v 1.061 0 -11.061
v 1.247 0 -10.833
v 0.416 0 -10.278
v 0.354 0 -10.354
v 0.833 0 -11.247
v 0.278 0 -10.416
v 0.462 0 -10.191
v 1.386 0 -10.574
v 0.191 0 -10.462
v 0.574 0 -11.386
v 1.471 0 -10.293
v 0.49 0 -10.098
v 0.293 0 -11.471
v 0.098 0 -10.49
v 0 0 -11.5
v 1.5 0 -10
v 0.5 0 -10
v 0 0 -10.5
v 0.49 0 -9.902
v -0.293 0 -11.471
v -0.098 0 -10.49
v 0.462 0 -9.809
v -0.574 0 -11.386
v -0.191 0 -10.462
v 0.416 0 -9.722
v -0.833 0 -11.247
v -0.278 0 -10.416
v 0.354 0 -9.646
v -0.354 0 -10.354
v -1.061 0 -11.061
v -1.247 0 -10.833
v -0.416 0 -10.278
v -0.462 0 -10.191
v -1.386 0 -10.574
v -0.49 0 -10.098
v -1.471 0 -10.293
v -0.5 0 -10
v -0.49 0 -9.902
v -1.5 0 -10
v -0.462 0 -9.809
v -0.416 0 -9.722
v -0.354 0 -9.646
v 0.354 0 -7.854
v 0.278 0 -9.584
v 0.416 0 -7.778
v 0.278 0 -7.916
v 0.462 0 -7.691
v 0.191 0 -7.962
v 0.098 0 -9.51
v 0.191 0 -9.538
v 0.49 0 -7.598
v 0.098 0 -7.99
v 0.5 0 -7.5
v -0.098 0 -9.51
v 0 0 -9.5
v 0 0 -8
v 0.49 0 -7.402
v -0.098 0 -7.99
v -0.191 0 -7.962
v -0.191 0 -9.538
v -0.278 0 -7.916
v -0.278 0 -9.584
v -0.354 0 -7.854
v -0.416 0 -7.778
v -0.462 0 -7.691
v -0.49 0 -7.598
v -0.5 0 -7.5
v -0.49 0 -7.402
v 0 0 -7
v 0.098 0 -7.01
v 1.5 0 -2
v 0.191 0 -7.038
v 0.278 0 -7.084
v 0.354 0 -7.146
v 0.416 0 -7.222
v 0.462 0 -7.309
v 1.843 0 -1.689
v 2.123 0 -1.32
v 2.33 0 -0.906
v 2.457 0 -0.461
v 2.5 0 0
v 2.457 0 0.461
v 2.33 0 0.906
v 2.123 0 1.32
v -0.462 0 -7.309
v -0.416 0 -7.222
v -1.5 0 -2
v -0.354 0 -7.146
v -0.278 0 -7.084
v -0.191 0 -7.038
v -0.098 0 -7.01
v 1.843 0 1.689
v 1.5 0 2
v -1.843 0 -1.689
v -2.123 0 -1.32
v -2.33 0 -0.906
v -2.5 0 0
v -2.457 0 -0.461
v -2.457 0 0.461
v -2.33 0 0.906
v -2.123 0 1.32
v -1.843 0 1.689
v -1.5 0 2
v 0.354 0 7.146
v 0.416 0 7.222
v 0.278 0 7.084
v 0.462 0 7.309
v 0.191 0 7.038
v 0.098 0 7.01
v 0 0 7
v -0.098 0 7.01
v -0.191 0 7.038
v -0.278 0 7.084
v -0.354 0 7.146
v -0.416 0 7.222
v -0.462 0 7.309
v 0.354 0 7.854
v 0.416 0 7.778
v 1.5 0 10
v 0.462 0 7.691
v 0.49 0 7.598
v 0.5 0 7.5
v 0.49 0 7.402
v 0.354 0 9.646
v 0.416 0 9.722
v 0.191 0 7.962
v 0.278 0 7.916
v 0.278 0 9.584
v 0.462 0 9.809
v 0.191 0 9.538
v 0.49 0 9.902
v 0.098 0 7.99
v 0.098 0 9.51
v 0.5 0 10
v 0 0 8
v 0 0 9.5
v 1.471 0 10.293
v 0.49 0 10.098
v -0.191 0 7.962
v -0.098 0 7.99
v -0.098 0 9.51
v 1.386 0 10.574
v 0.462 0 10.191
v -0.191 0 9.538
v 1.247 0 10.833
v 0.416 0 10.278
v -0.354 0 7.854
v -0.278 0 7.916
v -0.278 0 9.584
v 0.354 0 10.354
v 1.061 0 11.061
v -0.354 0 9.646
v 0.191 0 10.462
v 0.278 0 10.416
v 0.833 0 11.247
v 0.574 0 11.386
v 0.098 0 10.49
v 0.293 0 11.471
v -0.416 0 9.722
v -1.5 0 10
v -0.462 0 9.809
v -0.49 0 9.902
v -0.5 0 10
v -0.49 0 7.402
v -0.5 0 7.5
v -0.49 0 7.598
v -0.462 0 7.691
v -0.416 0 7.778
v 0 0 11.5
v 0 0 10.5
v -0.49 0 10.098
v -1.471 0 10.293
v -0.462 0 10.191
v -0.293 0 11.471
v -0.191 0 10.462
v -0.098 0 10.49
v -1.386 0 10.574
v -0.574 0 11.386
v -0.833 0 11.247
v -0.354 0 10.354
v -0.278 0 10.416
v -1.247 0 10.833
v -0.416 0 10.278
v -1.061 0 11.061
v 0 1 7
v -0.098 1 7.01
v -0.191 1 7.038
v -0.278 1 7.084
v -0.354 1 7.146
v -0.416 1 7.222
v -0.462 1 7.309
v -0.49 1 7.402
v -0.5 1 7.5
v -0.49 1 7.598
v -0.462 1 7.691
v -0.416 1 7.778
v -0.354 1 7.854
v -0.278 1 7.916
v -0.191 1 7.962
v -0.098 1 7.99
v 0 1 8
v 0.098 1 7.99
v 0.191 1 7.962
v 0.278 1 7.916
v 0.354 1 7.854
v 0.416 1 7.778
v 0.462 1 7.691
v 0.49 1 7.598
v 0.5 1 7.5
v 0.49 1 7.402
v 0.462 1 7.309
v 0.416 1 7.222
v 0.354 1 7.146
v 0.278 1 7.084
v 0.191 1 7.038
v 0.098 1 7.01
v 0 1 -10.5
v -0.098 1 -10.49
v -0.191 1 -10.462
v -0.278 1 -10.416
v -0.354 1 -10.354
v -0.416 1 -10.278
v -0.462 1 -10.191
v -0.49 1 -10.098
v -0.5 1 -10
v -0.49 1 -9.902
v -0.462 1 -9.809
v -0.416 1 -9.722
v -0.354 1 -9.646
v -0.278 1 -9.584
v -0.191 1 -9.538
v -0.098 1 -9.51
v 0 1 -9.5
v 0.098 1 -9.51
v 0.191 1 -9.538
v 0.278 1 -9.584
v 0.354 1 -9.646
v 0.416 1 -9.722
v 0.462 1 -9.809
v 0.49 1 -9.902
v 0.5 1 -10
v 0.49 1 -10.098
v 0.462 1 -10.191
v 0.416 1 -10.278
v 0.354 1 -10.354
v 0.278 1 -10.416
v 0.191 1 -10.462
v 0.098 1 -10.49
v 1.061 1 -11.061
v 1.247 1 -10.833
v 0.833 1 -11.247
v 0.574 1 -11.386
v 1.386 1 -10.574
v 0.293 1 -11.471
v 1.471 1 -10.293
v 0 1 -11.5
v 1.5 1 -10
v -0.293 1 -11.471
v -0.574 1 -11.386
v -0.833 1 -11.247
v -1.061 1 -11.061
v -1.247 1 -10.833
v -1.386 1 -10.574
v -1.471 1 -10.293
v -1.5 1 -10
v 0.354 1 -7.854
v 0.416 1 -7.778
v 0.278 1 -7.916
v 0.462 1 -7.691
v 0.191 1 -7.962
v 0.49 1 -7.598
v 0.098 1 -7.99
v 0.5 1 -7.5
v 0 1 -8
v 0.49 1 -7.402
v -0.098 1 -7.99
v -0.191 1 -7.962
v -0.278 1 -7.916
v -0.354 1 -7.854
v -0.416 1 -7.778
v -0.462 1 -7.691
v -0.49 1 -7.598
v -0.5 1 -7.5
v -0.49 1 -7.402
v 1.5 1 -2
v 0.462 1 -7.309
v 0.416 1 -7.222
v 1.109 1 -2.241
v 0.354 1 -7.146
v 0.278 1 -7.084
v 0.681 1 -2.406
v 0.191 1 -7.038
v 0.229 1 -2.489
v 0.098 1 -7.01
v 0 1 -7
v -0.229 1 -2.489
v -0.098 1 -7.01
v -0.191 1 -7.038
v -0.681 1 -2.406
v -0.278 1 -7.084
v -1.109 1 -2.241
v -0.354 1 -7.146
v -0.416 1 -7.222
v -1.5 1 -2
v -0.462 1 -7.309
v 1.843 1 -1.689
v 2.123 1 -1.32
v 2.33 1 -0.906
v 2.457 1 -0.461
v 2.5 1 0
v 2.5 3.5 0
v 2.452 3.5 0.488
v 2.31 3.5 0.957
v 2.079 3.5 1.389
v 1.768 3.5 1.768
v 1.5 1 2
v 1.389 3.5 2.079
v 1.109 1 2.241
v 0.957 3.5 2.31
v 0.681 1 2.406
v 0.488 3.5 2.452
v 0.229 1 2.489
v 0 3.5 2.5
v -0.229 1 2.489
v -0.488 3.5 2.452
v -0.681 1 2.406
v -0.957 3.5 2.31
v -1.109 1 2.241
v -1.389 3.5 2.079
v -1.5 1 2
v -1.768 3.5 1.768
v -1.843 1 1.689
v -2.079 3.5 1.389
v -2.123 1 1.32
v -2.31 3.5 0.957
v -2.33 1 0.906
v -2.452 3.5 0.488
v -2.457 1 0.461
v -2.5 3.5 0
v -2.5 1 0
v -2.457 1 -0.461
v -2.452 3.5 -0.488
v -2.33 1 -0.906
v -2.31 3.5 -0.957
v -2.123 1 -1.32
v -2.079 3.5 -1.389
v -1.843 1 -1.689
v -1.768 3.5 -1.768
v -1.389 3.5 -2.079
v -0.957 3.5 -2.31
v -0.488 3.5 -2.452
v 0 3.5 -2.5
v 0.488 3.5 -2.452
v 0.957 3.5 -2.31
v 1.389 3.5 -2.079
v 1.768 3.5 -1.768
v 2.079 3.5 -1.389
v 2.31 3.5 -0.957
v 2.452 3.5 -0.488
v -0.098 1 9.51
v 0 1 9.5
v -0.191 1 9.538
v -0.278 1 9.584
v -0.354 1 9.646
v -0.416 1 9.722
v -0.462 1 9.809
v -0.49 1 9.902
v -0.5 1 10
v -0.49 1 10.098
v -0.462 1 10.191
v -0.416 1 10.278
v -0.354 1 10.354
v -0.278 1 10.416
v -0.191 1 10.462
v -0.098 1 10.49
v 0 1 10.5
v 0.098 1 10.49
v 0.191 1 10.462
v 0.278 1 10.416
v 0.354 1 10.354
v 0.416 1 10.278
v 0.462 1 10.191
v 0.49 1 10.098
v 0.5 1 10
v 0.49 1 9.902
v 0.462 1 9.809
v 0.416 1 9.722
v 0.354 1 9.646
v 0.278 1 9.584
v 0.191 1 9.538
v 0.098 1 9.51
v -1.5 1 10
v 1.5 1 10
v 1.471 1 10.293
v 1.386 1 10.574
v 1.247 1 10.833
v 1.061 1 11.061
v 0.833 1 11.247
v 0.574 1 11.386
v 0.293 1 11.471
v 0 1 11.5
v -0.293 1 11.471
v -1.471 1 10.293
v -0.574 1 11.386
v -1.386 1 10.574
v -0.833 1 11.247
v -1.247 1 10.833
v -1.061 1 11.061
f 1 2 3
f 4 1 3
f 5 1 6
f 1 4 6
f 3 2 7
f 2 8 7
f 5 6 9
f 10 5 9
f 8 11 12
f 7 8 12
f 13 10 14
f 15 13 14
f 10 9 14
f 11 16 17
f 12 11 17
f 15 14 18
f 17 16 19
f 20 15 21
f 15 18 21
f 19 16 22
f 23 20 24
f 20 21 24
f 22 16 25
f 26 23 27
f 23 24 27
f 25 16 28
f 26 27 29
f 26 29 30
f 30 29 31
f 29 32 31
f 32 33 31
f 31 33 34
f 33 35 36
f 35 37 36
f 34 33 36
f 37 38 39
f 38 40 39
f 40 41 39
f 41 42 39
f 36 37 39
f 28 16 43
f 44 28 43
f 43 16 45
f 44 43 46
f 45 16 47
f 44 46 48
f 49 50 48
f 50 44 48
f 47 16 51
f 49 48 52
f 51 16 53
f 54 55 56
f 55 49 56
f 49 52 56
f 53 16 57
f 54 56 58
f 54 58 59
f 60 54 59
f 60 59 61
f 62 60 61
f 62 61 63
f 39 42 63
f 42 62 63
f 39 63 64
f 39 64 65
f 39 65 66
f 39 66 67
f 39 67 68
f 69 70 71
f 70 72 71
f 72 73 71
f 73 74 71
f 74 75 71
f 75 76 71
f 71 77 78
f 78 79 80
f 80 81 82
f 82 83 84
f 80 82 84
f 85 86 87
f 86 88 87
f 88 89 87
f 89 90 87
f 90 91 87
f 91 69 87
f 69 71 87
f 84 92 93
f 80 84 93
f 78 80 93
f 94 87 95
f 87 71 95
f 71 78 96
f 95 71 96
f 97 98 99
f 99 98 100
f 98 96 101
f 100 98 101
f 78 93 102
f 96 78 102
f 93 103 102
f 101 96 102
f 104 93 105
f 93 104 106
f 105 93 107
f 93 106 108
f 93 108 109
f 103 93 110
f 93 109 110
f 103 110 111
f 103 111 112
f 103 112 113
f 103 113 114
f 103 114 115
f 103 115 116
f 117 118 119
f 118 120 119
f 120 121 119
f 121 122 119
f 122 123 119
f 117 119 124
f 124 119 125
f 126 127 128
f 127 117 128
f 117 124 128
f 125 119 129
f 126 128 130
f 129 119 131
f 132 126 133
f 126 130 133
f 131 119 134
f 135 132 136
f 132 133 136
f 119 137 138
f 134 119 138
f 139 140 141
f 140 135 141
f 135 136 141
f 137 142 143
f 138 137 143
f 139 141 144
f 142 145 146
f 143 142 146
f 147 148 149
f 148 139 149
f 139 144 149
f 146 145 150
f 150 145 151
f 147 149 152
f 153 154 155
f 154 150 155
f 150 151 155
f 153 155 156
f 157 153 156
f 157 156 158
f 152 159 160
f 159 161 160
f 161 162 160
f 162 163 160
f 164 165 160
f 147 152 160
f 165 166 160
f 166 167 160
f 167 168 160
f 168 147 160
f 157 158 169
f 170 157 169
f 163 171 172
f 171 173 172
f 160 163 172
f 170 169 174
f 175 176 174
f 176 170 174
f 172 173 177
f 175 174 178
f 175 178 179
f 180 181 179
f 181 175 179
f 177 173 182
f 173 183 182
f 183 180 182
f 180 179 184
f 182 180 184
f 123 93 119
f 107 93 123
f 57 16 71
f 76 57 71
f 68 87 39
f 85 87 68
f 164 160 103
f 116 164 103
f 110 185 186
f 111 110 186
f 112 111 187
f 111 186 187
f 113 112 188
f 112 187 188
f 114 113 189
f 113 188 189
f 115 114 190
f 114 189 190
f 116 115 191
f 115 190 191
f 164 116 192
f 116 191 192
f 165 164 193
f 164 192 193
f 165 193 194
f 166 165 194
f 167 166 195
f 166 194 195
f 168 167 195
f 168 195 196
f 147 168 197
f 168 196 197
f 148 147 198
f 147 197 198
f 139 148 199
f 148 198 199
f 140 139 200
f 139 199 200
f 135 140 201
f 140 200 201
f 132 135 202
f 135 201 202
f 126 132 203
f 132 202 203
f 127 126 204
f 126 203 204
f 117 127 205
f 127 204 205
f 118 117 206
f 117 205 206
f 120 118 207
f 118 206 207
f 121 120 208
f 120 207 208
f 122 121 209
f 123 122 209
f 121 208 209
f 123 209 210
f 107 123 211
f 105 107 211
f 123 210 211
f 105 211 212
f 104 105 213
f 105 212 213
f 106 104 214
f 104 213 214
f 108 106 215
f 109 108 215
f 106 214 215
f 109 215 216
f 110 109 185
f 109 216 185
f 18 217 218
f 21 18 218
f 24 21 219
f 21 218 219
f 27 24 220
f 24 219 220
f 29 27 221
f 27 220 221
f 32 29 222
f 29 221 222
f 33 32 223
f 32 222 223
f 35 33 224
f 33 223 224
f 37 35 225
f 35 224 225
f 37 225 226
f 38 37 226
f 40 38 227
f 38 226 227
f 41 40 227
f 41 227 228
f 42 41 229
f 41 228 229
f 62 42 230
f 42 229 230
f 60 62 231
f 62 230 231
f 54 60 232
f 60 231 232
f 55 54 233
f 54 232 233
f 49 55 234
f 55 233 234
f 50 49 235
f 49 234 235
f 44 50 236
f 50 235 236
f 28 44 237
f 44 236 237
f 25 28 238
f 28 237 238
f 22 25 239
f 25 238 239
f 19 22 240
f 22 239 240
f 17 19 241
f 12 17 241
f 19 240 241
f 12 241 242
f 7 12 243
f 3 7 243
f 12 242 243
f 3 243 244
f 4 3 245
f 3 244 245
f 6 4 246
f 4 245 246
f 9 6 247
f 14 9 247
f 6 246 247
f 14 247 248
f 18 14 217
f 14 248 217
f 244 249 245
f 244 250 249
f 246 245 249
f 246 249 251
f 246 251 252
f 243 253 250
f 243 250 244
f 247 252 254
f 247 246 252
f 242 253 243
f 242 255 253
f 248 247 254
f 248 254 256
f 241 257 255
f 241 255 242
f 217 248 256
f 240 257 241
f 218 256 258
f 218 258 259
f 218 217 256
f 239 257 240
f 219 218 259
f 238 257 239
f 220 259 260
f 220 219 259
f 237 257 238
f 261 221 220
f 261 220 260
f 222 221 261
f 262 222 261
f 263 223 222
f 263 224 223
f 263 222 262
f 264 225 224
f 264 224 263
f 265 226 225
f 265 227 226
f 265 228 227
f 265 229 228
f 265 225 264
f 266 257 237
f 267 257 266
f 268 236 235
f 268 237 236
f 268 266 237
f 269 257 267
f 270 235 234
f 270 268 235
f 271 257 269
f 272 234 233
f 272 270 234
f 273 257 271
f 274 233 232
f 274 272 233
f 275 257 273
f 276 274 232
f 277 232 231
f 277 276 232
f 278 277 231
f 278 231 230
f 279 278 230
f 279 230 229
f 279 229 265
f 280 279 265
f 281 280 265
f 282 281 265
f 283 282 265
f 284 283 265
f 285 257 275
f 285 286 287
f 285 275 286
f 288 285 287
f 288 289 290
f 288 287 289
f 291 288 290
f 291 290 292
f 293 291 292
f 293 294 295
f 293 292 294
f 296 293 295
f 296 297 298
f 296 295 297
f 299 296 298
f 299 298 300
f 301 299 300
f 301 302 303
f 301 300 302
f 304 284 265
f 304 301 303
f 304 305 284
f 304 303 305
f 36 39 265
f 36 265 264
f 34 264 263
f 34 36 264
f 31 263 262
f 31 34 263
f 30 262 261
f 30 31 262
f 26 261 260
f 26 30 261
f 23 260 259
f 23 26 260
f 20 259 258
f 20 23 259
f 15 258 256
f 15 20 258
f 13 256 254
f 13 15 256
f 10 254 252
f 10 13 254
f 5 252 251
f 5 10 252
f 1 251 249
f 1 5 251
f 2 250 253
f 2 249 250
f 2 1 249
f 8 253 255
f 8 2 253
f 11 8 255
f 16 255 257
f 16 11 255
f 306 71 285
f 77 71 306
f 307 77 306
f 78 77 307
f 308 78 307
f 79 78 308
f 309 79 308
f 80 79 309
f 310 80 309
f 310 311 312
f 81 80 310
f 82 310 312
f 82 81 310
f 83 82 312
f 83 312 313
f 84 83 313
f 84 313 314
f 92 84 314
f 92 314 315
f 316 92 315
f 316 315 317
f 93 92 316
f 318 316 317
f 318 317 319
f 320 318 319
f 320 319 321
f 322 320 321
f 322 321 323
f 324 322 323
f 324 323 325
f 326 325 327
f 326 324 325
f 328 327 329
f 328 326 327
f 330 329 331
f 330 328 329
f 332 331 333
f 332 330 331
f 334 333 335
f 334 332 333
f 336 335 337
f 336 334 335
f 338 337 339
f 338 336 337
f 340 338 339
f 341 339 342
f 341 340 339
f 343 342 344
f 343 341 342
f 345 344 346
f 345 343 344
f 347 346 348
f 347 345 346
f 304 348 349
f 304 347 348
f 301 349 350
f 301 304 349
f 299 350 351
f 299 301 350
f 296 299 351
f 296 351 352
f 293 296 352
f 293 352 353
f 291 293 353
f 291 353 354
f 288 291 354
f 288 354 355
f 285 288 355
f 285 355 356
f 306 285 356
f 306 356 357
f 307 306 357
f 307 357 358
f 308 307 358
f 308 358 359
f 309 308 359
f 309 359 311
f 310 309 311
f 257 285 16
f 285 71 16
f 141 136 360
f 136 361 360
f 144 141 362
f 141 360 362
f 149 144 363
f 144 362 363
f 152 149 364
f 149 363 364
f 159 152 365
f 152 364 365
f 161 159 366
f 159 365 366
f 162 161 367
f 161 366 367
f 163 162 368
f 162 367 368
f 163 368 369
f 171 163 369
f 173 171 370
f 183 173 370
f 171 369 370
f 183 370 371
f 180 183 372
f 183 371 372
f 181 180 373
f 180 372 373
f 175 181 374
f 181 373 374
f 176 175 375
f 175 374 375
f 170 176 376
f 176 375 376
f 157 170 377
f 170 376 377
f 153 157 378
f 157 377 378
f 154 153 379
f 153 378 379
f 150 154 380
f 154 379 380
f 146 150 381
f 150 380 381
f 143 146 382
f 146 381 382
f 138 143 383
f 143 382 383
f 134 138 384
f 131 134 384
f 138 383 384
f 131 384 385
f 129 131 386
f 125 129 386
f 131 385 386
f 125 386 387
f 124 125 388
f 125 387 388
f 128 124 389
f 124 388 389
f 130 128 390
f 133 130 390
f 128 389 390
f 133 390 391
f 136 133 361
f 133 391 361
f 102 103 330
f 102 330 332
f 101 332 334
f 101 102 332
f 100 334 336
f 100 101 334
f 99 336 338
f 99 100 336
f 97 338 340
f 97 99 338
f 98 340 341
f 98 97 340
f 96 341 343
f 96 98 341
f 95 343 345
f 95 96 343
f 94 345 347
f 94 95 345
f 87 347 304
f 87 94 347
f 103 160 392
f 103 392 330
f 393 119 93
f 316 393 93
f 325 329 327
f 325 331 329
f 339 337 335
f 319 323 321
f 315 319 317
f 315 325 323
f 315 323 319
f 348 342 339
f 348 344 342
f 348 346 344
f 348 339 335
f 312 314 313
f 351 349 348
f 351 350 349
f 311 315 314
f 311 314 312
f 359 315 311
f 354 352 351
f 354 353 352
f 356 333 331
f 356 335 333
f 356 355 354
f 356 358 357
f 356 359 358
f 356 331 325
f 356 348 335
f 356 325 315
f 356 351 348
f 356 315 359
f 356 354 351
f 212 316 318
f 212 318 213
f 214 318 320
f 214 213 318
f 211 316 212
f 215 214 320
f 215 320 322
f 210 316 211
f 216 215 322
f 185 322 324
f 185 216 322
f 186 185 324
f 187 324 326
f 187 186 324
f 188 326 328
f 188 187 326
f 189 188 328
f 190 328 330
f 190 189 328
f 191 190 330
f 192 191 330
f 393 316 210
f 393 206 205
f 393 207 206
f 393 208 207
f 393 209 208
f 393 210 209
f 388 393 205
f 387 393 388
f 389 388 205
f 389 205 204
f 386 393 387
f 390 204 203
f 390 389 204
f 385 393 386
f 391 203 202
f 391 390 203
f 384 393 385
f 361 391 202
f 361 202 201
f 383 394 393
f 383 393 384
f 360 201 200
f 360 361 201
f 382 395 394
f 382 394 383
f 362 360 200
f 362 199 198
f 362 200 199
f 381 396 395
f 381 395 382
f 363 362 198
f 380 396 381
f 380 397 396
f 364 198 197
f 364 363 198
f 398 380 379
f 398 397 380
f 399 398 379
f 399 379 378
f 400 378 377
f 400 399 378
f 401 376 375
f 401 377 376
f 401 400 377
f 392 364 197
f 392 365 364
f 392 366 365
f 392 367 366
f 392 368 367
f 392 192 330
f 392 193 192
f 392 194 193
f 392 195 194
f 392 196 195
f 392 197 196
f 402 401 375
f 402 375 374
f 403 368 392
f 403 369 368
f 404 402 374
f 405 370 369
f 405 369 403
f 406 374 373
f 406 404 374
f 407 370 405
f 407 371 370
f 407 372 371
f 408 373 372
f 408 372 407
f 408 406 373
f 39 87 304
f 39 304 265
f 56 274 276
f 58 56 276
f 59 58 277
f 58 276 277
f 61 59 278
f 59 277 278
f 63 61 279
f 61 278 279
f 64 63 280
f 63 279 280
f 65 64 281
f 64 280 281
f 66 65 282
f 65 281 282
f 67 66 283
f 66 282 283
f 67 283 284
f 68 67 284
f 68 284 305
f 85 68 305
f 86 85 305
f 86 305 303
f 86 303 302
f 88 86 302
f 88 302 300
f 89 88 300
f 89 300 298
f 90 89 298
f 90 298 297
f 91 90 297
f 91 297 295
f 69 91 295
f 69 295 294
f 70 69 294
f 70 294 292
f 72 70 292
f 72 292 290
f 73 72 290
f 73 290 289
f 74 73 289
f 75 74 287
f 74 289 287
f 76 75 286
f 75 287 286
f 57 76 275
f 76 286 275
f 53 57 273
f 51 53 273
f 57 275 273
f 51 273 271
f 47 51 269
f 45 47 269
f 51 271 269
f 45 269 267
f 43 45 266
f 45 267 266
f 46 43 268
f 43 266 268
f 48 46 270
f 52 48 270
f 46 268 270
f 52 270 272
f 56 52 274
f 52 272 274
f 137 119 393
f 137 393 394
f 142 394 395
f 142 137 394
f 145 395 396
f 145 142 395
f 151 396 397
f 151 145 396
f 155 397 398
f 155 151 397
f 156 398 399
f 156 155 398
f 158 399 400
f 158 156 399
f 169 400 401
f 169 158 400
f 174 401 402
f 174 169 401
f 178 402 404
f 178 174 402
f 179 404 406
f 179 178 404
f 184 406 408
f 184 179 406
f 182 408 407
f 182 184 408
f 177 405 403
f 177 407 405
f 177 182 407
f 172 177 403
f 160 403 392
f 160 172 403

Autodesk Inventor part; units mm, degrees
ref_plane "YZ Plane" through (0, 0, 0) normal (1, 0, 0) x (0, 1, 0)
ref_plane "XZ Plane" through (0, 0, 0) normal (0, 1, 0) x (-1, 0, 0)
ref_plane "XY Plane" through (0, 0, 0) normal (0, 0, 1) x (1, 0, 0)
sketch "スケッチ1" plane through (0, 0, 0) normal (0, 1, 0) x (-1, 0, 0)
  circle A0 centre (0, 0) radius 2.5
  circle A1 centre (0, 10) radius 1.5
  circle A2 centre (0, -10) radius 1.5
  line L0 (1.5, 10) -> (1.5, 2)
  line L1 (-1.5, 10) -> (-1.5, 2)
  line L2 (-1.5, -2) -> (-1.5, -10)
  line L3 (1.5, -2) -> (1.5, -10)
  dimension "d0" = 5
  dimension "d1" = 3
  dimension "d2" = 3
  dimension "d3" = 10
  dimension "d4" = 10
extrude "押し出し1" add sketch "スケッチ1" along normal blind 1
sketch "スケッチ2" plane through (0, 1, 0) normal (0, 1, 0) x (1, 0, 0)
  arc A0 (-1.5, 2) -> (-1.5, -2) centre (0, 0) ccw projected
  circle A1 centre (0, 0) radius 2.5 projected
extrude "押し出し2" add sketch "スケッチ2" along normal blind 2.5
sketch "スケッチ3" plane through (0, 0, 0) normal (0, -1, 0) x (1, 0, 0)
  arc A0 (1.5, 10) -> (-1.5, 10) centre (0, 10) ccw projected
  arc A1 (-1.5, -10) -> (1.5, -10) centre (0, -10) ccw projected
  point P0 (0, 7.5)
  point P1 (0, -7.5)
  dimension "d9" = 2.5
  dimension "d10" = 2.5
hole "穴1" at (0, 0, 10) at (0, 0, -10) at (0, 0, 7.5) at (0, 0, -7.5) direction (0, 1, 0) diameter 1 end through all
equation "\"d4\" = d3"
equation "\"d10\" = d9"
properties part number "ナックル"
